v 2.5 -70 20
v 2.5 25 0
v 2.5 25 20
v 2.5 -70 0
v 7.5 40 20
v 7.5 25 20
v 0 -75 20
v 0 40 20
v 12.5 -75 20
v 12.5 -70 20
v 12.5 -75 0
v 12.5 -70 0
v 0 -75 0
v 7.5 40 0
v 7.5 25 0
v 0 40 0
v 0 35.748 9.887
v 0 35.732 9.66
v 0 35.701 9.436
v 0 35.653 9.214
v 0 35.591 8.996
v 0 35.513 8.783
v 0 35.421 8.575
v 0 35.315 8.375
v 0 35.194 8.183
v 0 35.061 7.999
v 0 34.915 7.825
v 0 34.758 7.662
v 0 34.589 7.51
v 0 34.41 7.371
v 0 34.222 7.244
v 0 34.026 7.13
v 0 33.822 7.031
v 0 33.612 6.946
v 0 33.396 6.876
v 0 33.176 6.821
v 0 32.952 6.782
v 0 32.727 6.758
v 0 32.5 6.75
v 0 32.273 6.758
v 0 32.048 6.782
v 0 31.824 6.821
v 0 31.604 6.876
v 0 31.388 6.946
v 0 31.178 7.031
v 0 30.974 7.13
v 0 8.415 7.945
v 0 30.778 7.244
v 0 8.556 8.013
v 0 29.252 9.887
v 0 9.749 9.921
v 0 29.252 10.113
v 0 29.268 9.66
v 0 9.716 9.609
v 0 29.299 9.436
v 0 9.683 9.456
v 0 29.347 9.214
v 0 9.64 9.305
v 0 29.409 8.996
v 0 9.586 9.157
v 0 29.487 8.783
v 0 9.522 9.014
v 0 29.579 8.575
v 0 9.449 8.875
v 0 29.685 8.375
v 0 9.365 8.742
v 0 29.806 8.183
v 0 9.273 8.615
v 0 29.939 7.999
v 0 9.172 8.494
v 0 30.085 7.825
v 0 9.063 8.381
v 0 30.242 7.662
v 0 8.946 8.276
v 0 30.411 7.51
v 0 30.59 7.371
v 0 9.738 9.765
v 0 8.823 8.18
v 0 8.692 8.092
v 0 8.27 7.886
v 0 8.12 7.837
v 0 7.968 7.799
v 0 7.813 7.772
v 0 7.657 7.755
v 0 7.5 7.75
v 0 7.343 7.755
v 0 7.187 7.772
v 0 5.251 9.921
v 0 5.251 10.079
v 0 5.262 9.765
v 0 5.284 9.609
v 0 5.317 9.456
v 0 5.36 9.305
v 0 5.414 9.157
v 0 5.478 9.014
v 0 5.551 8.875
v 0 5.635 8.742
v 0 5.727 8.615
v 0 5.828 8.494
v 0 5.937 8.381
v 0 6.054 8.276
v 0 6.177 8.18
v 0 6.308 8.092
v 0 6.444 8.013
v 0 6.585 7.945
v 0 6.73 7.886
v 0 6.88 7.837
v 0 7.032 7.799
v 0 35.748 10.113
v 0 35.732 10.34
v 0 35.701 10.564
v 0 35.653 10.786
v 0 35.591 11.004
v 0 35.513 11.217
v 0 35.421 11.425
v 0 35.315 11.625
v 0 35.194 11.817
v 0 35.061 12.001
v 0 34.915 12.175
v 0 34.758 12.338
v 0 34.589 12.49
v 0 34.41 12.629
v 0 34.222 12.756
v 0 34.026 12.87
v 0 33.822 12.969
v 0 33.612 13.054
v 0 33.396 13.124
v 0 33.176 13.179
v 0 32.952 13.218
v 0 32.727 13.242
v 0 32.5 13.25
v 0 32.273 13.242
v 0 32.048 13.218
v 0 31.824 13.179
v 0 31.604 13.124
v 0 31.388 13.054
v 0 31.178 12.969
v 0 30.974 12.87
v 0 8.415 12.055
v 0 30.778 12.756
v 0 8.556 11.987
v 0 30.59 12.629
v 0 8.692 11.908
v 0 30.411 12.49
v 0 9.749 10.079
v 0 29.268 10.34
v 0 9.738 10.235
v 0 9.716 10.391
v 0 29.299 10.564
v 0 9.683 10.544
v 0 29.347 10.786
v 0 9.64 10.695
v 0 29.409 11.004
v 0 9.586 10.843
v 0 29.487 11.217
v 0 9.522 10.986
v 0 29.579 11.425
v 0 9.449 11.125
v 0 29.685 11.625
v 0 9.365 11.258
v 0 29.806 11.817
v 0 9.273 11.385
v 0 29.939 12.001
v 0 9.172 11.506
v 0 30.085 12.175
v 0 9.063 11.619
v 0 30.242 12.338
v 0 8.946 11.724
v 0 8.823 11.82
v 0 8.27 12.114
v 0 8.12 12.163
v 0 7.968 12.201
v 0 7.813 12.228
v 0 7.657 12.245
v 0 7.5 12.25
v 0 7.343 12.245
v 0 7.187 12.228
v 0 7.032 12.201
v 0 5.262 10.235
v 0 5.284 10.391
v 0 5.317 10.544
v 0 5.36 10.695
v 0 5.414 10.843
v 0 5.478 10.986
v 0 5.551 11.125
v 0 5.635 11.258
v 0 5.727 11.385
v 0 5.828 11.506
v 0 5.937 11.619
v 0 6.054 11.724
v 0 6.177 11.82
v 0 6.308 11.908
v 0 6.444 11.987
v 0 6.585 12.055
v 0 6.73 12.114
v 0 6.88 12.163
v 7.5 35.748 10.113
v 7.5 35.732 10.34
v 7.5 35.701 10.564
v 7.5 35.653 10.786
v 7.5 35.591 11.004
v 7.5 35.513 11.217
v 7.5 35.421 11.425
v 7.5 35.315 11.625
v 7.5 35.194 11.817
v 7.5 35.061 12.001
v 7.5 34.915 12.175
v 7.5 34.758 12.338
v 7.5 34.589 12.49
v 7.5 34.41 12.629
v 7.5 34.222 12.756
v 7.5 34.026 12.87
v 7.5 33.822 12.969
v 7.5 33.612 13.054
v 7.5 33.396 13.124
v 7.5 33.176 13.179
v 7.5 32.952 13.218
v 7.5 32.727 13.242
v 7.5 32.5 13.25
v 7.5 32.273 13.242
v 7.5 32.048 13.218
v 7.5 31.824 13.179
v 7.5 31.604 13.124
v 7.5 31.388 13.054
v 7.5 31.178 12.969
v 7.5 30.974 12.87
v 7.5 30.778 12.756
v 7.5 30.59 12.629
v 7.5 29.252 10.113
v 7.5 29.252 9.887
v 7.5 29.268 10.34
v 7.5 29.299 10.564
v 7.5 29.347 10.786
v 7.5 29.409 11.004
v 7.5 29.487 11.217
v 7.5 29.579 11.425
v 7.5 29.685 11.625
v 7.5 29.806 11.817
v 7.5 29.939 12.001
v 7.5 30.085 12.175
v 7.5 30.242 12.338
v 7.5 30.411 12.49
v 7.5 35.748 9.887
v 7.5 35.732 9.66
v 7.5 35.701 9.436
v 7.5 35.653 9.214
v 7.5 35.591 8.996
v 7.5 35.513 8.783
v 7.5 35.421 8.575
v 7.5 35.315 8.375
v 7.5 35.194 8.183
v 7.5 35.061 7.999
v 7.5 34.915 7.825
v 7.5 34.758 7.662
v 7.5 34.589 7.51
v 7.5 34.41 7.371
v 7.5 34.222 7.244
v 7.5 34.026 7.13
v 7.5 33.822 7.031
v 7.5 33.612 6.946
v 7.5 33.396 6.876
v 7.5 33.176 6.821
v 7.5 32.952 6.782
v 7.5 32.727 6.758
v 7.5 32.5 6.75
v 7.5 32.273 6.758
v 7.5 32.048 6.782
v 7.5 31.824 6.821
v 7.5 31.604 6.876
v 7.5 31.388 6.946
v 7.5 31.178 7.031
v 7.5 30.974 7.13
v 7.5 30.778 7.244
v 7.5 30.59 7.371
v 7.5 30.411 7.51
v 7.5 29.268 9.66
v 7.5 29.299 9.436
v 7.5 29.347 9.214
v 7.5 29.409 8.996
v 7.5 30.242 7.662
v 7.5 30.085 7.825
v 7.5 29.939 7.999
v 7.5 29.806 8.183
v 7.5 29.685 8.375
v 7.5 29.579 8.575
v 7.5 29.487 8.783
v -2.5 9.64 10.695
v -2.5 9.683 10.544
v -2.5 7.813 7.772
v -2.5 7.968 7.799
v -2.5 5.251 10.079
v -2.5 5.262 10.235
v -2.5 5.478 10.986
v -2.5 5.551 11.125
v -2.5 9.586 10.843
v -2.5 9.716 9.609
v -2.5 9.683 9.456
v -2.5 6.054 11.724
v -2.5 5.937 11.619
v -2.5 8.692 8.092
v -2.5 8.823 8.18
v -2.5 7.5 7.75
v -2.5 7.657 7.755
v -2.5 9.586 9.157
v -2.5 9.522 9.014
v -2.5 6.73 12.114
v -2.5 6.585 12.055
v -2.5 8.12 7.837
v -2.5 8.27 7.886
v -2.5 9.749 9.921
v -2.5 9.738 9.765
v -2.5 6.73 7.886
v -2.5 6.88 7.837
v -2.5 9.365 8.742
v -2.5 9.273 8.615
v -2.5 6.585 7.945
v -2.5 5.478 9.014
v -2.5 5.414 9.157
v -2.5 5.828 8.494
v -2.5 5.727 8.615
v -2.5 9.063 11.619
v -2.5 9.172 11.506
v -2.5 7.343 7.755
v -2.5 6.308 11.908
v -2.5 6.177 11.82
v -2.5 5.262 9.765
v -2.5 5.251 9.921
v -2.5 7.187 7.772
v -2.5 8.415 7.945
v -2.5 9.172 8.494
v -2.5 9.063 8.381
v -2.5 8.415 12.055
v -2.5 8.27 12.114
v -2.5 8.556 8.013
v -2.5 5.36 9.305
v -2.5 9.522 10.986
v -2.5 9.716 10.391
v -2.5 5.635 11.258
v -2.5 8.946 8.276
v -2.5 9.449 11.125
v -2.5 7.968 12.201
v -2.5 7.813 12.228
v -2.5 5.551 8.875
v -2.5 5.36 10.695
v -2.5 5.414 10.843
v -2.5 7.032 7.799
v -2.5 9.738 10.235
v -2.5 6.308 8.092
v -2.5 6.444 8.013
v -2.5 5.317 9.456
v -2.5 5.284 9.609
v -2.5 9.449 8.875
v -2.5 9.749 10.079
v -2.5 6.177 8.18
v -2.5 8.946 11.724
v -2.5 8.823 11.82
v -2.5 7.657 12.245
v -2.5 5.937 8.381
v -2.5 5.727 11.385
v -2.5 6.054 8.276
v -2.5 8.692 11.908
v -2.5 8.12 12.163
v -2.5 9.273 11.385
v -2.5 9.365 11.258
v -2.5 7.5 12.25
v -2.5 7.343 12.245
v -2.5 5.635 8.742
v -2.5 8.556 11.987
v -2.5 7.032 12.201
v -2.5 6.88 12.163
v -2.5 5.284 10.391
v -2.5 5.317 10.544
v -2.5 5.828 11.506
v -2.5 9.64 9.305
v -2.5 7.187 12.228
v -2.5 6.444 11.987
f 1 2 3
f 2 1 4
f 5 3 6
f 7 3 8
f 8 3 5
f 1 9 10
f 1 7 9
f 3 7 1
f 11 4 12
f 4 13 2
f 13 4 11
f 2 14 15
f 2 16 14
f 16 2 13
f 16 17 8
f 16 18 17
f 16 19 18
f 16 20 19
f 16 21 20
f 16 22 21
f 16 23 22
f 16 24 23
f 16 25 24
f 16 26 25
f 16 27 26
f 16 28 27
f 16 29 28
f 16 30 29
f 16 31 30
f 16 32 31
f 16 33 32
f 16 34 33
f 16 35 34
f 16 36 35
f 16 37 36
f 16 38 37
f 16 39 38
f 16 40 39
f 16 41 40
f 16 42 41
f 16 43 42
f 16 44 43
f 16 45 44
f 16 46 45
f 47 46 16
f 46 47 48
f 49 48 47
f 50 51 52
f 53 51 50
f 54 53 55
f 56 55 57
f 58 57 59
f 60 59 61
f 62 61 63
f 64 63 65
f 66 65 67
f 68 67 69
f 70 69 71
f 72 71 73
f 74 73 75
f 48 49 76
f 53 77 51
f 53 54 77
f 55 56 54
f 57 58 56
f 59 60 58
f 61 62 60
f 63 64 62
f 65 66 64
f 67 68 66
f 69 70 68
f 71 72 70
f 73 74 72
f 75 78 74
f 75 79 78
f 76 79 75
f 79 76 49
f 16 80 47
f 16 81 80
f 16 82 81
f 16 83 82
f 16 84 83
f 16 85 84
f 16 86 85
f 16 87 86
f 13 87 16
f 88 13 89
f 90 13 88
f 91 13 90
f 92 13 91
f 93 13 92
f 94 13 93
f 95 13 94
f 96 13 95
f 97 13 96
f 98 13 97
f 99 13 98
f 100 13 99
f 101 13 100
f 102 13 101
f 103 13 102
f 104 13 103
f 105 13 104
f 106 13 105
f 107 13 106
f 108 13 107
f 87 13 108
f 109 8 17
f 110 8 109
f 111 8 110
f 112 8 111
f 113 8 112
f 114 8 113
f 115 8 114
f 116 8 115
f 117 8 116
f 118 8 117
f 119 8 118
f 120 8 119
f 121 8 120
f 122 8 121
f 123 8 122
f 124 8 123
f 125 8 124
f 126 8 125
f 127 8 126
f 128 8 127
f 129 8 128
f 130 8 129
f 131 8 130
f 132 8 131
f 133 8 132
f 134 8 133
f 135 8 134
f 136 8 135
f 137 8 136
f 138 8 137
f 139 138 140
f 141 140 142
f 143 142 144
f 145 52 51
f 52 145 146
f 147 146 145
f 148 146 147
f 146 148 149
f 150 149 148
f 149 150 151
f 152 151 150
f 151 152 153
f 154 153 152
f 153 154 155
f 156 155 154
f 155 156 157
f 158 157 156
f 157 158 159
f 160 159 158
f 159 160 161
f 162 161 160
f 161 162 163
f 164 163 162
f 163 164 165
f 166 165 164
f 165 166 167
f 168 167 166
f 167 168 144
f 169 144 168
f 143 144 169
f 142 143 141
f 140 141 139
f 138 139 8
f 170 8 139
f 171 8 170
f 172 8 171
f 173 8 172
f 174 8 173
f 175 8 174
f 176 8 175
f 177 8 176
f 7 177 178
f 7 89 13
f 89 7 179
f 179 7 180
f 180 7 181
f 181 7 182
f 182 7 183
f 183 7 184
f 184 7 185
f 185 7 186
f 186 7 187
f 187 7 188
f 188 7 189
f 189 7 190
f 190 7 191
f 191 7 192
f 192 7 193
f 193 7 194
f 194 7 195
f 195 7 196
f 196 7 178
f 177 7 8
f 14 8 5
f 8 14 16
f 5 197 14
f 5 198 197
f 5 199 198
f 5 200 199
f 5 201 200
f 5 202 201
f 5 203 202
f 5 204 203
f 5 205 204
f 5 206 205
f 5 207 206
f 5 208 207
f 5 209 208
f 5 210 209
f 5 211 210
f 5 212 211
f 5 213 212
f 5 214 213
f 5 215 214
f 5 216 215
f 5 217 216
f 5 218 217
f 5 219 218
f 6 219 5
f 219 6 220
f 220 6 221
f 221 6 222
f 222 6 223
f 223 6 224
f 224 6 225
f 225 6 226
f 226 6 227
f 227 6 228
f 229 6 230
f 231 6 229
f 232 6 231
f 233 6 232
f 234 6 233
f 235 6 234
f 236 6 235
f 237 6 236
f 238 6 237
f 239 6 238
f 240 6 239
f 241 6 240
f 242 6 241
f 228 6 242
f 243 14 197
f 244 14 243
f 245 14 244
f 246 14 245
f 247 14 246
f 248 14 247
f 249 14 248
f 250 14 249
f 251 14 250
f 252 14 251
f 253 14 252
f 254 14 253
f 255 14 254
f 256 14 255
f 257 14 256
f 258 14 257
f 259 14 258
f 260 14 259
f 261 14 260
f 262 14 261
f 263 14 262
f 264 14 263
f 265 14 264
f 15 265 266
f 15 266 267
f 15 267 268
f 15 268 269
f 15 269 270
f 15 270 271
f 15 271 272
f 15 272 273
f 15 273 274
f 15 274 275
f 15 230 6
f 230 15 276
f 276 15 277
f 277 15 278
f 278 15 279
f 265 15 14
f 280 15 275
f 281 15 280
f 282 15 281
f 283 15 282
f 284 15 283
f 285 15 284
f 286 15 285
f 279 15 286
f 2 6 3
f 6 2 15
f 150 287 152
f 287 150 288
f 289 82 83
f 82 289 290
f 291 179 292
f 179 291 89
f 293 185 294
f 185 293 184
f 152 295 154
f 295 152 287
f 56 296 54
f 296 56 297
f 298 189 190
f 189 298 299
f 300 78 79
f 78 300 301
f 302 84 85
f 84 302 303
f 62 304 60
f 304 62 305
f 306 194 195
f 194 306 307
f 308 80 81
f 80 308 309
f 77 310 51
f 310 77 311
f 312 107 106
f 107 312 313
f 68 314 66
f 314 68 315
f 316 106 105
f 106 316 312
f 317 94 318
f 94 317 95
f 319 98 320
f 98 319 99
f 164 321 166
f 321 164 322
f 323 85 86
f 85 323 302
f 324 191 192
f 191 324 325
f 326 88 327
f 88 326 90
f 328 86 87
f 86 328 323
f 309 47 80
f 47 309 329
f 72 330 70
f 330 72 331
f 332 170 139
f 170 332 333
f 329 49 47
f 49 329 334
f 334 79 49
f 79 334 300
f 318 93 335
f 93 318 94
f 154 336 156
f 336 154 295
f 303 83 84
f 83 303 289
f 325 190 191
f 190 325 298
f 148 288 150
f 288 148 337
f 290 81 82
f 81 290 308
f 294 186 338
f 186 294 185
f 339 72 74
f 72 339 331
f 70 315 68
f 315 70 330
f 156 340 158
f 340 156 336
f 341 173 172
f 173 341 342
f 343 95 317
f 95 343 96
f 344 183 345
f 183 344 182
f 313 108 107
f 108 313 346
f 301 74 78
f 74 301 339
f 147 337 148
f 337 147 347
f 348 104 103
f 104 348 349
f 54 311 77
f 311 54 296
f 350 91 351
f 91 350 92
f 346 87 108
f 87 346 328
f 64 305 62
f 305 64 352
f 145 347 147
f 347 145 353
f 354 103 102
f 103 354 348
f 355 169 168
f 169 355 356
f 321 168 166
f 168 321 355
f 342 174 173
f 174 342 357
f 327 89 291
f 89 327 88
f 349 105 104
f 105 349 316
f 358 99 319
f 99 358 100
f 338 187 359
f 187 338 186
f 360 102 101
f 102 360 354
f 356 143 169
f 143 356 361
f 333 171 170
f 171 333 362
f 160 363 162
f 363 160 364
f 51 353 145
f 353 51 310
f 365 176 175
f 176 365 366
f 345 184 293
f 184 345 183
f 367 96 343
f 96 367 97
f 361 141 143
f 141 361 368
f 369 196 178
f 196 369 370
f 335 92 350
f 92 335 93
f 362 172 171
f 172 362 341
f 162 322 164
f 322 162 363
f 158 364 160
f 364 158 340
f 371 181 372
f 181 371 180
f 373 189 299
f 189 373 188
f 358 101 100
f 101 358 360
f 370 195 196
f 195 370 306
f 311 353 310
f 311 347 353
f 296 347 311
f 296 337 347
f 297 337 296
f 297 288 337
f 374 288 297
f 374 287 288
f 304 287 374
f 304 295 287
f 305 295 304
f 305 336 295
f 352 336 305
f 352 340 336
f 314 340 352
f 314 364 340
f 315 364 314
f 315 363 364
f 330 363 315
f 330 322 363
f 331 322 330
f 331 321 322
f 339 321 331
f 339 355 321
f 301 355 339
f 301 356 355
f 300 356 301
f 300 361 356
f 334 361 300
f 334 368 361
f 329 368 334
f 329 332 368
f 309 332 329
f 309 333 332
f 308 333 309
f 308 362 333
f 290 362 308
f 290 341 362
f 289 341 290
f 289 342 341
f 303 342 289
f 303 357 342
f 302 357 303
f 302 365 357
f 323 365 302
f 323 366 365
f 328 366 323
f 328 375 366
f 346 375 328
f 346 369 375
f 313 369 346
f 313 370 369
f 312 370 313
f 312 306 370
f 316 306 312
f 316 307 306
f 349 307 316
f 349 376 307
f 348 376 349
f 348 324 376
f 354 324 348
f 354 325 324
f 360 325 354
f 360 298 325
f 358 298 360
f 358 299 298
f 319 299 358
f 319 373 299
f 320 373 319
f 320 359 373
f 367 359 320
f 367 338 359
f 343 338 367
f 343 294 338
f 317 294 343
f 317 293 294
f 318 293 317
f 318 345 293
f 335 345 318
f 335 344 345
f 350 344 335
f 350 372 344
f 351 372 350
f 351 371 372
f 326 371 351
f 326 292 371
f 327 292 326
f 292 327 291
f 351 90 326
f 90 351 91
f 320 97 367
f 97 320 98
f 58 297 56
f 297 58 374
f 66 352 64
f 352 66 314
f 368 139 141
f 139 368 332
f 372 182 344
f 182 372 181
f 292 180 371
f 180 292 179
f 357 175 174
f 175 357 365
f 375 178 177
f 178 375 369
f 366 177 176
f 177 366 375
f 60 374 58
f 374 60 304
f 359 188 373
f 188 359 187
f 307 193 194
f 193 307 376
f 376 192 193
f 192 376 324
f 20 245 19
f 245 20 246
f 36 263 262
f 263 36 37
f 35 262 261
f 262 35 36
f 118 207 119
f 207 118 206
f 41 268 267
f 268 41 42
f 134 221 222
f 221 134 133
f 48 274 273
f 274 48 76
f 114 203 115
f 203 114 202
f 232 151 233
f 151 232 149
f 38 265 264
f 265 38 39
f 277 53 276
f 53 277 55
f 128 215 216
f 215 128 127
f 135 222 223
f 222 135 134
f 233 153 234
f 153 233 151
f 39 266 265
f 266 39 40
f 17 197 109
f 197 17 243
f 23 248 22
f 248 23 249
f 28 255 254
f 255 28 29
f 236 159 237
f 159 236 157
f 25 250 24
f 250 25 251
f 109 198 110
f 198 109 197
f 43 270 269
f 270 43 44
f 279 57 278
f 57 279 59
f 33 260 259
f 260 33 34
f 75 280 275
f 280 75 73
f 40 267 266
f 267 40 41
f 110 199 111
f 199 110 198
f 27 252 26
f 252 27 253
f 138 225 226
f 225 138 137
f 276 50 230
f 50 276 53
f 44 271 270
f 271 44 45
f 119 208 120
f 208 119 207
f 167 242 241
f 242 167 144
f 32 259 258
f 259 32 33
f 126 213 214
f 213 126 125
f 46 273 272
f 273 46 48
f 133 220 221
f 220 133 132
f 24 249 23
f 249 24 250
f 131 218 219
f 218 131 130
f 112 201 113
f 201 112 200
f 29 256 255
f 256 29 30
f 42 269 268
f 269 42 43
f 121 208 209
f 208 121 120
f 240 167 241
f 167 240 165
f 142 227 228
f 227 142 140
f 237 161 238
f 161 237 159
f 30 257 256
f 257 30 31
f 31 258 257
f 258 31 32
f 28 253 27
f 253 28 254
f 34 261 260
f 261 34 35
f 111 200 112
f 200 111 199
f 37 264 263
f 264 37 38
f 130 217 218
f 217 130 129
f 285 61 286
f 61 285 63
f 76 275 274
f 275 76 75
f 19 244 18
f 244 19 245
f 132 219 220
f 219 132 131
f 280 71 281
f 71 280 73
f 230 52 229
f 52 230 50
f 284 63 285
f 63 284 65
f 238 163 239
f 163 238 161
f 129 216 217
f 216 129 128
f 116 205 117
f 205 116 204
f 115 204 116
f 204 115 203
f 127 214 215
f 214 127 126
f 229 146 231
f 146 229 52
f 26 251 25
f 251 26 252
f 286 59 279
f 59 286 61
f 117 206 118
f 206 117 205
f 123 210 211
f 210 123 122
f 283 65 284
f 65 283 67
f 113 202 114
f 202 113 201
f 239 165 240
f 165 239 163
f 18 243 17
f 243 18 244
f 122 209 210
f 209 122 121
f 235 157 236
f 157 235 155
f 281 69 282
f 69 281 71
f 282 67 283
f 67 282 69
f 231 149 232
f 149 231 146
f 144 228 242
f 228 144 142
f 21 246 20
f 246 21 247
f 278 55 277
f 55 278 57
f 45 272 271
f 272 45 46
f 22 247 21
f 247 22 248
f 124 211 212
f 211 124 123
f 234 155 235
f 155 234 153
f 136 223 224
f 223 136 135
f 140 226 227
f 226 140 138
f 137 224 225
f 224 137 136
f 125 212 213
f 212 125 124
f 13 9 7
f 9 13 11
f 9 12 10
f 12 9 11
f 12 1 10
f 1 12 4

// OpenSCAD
$fa=4; // default minimum facet angle is now 4
$fs=0.05; // default minimum facet size is now 0.05 mm

union() {
  difference() {
    union() {
      cube([2.5, 40, 20]);
      translate([0, 25, 0]) cube([7.5, 15, 20]);
      translate([-2.5, 7.5, 10]) rotate([0, 90, 0]) cylinder(h = 2.6, r=2.25);
    }
    translate([-1, 32.5, 10]) rotate([0, 90, 0]) cylinder(h = 15, r=3.25);
  }
  translate([0, -75, 0]) cube([2.5, 75, 20]);
  translate([0, -75, 0]) cube([12.5, 5, 20]);
}
